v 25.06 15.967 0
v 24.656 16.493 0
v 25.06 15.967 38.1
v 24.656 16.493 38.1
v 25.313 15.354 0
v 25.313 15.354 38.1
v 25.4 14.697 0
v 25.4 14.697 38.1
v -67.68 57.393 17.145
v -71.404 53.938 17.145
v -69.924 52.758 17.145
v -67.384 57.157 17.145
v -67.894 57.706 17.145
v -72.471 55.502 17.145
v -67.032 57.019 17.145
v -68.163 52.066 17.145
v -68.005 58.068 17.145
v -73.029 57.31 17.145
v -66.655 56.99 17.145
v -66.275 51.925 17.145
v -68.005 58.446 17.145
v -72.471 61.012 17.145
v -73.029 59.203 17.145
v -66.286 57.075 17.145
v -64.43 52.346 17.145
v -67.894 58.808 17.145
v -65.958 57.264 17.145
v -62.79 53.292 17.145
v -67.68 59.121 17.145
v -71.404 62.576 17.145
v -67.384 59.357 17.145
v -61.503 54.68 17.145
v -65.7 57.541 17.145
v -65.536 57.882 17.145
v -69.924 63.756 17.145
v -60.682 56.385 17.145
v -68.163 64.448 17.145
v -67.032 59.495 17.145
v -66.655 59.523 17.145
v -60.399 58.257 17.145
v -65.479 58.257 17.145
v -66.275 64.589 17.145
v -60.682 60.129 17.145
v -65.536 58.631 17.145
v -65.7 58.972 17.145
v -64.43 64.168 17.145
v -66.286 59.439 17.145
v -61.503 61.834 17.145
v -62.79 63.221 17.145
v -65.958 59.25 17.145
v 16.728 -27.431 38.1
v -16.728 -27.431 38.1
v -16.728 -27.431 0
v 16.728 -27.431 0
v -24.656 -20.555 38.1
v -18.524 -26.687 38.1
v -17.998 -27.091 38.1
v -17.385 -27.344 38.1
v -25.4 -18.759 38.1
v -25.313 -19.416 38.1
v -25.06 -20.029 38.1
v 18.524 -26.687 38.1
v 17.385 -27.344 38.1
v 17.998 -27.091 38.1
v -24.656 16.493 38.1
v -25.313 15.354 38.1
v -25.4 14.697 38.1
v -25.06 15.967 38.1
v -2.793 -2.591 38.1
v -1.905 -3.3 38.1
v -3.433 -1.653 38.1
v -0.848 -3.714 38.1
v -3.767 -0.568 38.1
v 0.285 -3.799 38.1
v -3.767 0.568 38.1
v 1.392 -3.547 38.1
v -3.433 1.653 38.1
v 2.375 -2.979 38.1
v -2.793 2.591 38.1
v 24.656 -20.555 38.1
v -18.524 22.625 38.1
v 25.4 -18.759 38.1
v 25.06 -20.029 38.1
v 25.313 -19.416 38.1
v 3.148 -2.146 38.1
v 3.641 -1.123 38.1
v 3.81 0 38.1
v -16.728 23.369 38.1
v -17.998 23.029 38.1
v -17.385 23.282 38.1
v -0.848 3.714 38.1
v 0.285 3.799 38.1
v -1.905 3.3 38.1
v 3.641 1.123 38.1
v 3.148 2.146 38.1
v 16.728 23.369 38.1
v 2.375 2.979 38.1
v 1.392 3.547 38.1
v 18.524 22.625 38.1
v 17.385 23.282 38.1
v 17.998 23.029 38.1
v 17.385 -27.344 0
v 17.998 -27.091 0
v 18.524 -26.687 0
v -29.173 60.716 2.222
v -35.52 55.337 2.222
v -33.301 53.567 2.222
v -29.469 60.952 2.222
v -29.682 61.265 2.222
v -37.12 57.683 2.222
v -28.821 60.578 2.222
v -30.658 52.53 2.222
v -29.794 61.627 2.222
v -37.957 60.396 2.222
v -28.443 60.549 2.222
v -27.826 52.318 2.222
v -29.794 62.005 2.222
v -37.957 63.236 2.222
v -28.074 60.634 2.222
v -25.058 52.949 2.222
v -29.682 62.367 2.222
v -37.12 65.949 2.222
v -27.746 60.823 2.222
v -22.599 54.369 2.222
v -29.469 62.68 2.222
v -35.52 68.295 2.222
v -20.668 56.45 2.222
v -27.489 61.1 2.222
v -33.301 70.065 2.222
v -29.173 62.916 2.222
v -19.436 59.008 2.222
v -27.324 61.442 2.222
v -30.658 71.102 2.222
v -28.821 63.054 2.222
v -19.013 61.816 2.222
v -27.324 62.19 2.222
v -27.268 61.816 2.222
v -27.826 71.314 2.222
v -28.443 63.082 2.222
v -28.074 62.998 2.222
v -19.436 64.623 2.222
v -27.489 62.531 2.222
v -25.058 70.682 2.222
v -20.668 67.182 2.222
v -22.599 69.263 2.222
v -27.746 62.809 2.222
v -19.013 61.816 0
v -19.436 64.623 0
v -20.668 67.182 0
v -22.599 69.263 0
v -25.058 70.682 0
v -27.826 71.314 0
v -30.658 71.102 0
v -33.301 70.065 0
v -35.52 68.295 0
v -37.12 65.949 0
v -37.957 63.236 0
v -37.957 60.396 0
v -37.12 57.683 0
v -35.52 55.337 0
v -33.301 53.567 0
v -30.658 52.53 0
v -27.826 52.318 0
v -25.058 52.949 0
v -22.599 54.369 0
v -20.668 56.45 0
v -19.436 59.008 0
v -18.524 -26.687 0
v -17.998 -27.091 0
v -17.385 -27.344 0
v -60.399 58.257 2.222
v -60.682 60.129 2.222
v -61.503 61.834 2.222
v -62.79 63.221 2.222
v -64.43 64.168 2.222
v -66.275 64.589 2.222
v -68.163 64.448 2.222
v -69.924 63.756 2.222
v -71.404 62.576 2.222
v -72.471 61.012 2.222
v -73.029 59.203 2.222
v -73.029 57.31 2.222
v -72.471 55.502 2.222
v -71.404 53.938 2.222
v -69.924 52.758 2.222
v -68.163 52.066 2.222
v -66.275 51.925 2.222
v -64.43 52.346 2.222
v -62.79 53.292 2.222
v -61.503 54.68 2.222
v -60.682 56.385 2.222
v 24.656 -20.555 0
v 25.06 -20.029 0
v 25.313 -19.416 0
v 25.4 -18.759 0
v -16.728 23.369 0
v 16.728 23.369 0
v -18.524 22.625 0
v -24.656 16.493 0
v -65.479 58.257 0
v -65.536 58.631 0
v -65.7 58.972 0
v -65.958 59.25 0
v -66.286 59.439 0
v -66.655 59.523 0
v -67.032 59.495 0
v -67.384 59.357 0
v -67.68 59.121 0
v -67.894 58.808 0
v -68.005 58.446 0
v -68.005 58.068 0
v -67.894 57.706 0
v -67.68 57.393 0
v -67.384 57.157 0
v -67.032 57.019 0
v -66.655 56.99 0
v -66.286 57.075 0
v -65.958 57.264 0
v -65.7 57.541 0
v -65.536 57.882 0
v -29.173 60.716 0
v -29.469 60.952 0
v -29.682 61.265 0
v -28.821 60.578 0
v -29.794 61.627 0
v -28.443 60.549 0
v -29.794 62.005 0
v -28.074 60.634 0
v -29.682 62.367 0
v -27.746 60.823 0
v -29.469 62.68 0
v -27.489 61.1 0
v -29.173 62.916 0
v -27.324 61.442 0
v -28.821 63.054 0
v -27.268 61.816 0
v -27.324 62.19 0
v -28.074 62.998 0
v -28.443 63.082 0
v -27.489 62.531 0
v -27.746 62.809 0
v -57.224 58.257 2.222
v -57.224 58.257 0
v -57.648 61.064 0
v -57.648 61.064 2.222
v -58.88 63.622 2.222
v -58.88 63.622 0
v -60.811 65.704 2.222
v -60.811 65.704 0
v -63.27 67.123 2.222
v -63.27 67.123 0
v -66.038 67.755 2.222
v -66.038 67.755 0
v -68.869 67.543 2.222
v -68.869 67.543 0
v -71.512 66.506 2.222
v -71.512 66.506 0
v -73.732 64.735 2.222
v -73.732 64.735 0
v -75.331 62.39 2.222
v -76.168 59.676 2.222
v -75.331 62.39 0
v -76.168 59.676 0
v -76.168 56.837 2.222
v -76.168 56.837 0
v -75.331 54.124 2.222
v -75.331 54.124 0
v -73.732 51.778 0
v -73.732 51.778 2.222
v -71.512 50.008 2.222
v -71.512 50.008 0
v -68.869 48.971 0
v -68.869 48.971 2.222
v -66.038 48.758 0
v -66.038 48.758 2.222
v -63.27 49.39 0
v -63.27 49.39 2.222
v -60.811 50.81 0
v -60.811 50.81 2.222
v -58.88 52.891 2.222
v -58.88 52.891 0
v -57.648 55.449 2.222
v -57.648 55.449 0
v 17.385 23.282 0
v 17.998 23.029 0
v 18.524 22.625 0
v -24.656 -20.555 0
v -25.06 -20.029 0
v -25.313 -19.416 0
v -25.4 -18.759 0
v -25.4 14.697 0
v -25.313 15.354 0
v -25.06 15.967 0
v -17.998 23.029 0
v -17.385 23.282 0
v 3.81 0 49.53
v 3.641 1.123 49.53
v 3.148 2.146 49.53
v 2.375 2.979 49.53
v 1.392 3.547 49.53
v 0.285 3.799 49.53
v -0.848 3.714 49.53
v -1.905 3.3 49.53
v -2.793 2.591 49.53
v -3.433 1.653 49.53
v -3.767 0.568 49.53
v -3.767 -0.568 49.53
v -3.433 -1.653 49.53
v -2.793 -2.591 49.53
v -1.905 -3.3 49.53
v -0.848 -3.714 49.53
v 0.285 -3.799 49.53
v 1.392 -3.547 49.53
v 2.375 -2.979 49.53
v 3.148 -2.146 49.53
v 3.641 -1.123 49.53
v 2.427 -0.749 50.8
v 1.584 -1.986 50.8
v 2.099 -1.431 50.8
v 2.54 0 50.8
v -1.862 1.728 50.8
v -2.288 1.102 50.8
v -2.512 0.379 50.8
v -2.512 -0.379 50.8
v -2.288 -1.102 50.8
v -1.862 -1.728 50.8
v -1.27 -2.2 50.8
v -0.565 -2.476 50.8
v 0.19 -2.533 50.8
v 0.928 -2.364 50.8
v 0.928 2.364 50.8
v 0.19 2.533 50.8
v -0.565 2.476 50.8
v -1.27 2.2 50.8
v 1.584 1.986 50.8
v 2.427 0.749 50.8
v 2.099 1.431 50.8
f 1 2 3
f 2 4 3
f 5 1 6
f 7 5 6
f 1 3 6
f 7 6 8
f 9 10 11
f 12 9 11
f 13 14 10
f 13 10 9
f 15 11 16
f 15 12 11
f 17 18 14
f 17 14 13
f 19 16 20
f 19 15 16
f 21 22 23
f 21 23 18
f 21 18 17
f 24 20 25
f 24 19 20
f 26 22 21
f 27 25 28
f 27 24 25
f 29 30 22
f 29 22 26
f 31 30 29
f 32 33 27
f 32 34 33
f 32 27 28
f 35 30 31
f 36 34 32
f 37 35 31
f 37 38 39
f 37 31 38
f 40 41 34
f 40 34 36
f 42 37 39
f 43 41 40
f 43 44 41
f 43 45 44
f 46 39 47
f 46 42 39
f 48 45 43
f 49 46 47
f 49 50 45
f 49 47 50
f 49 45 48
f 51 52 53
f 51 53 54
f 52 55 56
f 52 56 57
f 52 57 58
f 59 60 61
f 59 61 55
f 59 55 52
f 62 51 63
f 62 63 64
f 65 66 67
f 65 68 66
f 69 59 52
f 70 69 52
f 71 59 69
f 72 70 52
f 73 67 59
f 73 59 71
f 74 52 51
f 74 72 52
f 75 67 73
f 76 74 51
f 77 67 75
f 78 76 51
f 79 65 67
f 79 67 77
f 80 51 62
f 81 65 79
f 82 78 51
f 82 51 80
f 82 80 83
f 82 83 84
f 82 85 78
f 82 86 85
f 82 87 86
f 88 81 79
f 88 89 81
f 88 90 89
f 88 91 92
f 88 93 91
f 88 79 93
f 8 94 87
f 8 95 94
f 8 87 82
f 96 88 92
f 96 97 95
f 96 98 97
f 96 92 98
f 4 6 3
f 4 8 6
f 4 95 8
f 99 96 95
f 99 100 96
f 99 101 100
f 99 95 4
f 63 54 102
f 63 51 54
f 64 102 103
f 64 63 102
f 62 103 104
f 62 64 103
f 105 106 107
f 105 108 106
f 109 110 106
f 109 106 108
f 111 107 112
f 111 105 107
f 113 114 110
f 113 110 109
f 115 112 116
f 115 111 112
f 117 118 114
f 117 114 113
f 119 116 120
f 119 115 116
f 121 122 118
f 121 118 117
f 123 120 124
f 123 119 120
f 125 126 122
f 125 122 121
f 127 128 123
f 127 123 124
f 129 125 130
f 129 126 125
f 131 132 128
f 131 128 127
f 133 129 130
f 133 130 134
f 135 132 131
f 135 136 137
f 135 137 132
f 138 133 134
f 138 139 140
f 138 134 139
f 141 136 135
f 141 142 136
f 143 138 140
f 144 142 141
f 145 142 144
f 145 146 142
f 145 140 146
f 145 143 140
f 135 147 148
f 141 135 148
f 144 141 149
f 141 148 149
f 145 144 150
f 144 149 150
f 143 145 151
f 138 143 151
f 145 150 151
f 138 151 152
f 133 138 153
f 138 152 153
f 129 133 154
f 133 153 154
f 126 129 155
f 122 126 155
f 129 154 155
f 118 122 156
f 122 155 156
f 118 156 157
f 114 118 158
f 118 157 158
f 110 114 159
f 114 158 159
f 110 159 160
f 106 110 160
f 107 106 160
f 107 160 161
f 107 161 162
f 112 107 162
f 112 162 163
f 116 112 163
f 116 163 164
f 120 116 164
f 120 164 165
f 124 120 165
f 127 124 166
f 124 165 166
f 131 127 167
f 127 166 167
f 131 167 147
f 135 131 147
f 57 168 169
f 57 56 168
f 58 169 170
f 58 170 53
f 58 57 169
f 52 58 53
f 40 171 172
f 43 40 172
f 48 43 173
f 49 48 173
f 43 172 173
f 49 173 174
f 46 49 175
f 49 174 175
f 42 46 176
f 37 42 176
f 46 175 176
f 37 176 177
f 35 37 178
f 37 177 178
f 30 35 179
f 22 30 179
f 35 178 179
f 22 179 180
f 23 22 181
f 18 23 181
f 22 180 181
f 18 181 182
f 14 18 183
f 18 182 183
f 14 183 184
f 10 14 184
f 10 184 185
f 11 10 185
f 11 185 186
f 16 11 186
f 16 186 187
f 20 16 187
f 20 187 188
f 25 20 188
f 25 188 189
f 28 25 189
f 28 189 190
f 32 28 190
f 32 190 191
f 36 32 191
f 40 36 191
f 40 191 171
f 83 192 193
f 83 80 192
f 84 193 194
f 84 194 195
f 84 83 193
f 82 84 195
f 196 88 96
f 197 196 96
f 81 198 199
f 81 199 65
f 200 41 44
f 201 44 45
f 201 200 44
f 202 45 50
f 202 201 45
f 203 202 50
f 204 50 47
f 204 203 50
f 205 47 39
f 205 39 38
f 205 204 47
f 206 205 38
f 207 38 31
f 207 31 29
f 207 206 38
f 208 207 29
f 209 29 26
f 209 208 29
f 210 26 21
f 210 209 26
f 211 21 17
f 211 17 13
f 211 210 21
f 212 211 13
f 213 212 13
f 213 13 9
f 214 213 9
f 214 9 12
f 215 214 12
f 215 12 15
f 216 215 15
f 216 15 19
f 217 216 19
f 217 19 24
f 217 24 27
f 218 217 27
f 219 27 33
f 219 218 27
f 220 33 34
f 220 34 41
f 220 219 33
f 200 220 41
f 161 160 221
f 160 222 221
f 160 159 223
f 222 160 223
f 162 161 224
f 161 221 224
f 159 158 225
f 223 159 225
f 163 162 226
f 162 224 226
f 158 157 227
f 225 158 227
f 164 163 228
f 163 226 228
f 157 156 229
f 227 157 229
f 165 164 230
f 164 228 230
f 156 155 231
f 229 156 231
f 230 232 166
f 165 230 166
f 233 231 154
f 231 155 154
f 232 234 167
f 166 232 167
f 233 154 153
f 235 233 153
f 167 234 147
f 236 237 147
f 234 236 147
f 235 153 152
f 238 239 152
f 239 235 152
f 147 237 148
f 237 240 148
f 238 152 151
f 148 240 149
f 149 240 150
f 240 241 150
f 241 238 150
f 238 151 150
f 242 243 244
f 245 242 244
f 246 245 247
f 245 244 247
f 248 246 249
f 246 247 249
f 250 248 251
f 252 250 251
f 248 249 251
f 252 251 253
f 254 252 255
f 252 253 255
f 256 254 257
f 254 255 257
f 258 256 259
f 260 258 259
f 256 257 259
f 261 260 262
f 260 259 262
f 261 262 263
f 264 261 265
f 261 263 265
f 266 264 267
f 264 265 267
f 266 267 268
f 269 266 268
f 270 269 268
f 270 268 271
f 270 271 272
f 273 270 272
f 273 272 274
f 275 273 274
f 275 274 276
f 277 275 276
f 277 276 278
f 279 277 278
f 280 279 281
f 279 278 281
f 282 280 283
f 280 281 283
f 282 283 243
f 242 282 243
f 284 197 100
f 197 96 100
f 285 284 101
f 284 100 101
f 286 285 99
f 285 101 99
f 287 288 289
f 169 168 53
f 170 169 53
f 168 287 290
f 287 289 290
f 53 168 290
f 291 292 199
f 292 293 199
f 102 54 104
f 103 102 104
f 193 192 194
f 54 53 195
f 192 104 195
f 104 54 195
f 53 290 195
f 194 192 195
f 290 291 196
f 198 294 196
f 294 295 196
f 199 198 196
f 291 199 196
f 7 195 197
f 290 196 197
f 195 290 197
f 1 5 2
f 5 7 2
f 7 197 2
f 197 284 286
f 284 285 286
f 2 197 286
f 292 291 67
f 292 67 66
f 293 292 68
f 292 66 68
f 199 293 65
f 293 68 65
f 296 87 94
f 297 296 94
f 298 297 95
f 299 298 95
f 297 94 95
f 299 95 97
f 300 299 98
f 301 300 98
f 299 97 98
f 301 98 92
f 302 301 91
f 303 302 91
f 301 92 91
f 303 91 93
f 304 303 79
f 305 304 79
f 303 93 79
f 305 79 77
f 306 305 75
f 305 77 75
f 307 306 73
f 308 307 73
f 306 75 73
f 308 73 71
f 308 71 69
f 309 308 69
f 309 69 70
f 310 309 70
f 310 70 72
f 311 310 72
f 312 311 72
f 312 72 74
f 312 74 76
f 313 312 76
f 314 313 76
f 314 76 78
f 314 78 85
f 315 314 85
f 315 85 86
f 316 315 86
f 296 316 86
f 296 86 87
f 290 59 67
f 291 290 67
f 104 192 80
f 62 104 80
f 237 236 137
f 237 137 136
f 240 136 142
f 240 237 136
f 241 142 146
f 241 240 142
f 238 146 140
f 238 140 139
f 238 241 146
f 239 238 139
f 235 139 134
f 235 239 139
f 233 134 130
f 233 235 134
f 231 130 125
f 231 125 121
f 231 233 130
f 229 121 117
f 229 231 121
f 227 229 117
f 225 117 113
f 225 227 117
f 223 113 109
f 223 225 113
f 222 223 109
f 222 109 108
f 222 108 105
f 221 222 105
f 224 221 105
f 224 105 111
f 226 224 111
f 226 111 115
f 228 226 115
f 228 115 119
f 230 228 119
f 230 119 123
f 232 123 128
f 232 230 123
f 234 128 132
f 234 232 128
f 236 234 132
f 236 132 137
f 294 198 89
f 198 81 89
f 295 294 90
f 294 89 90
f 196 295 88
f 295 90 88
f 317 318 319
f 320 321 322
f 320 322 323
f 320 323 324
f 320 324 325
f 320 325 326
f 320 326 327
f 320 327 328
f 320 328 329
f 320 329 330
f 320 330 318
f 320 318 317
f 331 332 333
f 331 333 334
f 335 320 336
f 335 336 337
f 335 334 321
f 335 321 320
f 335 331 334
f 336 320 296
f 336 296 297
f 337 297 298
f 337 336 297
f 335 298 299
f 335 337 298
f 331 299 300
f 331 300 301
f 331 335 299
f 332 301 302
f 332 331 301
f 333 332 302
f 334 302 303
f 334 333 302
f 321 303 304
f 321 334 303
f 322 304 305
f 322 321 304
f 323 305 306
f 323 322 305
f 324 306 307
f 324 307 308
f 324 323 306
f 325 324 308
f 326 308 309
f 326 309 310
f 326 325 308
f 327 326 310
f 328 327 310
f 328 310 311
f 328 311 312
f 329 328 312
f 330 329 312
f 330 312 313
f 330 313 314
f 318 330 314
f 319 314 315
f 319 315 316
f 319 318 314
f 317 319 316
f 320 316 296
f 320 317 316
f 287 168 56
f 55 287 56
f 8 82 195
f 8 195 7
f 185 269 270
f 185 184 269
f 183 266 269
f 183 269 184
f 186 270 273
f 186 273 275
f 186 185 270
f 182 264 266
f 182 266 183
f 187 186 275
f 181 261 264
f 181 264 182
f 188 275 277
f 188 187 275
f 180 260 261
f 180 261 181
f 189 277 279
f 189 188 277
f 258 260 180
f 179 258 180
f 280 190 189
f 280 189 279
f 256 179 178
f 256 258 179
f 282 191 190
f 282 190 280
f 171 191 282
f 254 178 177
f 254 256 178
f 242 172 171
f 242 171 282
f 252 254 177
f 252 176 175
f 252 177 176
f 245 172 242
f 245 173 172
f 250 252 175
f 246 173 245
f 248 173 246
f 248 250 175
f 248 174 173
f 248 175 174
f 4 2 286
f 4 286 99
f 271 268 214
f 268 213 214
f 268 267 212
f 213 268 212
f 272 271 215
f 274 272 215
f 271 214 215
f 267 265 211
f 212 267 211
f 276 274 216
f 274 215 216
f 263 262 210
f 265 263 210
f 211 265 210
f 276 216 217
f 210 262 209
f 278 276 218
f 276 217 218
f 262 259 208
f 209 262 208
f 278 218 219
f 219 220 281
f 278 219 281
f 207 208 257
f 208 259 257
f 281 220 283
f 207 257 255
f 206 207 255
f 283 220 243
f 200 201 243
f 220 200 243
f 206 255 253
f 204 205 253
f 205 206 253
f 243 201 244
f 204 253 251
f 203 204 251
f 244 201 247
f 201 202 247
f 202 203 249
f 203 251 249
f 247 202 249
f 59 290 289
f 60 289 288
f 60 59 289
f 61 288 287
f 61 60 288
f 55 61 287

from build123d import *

# Parameters (mm, degrees)
F0_W     = 50.8
F0_H     = 50.8
F0_R     = 3.81
F1_DEPTH = 38.1
F2_DEPTH = 50.8
F3_SIZE  = 7.62
F4_R     = 2.54
F5_SIZE  = 1.27
F6_R     = 9.525
F6_R_2   = 6.35
F7_DEPTH = 2.2225
F6_R_3   = 1.27
F8_DEPTH = 17.145
F9_DEPTH = 2.2225


with BuildPart() as f1:
    # F0 (on Top) → F1 (new body)
    with BuildSketch(Plane.XY):
        with Locations((0, -2.0310165685)):
            Rectangle(F0_W, F0_H)
        Circle(F0_R, mode=Mode.SUBTRACT)
    extrude(amount=F1_DEPTH)

    # F0 (on Top) → F2 (join)
    with BuildSketch(Plane.XY):
        Circle(F0_R)
    extrude(amount=F2_DEPTH)

    # F3
    f3_edges = [f1.edges().sort_by_distance(p)[0] for p in [
        (-25.4, -27.431017, 19.05),
        (25.4, -27.431017, 19.05),
        (25.4, 23.368983, 19.05),
        (-25.4, 23.368983, 19.05),
    ]]
    chamfer(f3_edges, length=F3_SIZE)

    # F4
    f4_edges = [f1.edges().sort_by_distance(p)[0] for p in [
        (-25.4, -19.811017, 19.05),
        (-17.78, -27.431017, 19.05),
        (17.78, -27.431017, 19.05),
        (25.4, -19.811017, 19.05),
        (17.78, 23.368983, 19.05),
        (25.4, 15.748983, 19.05),
        (-17.78, 23.368983, 19.05),
        (-25.4, 15.748983, 19.05),
    ]]
    fillet(f4_edges, radius=F4_R)

    # F5
    f5_edges = [f1.edges().sort_by_distance(p)[0] for p in [
        (-3.81, 0, 50.8),
    ]]
    chamfer(f5_edges, length=F5_SIZE)


with BuildPart() as f7:
    # F6 (on Top) → F7 (new body)
    with BuildSketch(Plane.XY):
        with Locations((-66.7494982481, 58.256816119)):
            Circle(F6_R)
        with Locations((-66.7494982481, 58.256816119)):
            Circle(F6_R_2, mode=Mode.SUBTRACT)
    extrude(amount=F7_DEPTH)

    # F6 (on Top) → F8 (join)
    with BuildSketch(Plane.XY):
        with Locations((-66.7494982481, 58.256816119)):
            Circle(F6_R_2)
        with Locations((-66.7494982481, 58.256816119)):
            Circle(F6_R_3, mode=Mode.SUBTRACT)
    extrude(amount=F8_DEPTH)


with BuildPart() as f9:
    # F6 (on Top) → F9 (new body)
    with BuildSketch(Plane.XY):
        with Locations((-28.5380091518, 61.8159025908)):
            Circle(F6_R)
        with Locations((-28.5380091518, 61.8159025908)):
            Circle(F6_R_3, mode=Mode.SUBTRACT)
    extrude(amount=F9_DEPTH)


solid = Compound([f1.part, f7.part, f9.part])
